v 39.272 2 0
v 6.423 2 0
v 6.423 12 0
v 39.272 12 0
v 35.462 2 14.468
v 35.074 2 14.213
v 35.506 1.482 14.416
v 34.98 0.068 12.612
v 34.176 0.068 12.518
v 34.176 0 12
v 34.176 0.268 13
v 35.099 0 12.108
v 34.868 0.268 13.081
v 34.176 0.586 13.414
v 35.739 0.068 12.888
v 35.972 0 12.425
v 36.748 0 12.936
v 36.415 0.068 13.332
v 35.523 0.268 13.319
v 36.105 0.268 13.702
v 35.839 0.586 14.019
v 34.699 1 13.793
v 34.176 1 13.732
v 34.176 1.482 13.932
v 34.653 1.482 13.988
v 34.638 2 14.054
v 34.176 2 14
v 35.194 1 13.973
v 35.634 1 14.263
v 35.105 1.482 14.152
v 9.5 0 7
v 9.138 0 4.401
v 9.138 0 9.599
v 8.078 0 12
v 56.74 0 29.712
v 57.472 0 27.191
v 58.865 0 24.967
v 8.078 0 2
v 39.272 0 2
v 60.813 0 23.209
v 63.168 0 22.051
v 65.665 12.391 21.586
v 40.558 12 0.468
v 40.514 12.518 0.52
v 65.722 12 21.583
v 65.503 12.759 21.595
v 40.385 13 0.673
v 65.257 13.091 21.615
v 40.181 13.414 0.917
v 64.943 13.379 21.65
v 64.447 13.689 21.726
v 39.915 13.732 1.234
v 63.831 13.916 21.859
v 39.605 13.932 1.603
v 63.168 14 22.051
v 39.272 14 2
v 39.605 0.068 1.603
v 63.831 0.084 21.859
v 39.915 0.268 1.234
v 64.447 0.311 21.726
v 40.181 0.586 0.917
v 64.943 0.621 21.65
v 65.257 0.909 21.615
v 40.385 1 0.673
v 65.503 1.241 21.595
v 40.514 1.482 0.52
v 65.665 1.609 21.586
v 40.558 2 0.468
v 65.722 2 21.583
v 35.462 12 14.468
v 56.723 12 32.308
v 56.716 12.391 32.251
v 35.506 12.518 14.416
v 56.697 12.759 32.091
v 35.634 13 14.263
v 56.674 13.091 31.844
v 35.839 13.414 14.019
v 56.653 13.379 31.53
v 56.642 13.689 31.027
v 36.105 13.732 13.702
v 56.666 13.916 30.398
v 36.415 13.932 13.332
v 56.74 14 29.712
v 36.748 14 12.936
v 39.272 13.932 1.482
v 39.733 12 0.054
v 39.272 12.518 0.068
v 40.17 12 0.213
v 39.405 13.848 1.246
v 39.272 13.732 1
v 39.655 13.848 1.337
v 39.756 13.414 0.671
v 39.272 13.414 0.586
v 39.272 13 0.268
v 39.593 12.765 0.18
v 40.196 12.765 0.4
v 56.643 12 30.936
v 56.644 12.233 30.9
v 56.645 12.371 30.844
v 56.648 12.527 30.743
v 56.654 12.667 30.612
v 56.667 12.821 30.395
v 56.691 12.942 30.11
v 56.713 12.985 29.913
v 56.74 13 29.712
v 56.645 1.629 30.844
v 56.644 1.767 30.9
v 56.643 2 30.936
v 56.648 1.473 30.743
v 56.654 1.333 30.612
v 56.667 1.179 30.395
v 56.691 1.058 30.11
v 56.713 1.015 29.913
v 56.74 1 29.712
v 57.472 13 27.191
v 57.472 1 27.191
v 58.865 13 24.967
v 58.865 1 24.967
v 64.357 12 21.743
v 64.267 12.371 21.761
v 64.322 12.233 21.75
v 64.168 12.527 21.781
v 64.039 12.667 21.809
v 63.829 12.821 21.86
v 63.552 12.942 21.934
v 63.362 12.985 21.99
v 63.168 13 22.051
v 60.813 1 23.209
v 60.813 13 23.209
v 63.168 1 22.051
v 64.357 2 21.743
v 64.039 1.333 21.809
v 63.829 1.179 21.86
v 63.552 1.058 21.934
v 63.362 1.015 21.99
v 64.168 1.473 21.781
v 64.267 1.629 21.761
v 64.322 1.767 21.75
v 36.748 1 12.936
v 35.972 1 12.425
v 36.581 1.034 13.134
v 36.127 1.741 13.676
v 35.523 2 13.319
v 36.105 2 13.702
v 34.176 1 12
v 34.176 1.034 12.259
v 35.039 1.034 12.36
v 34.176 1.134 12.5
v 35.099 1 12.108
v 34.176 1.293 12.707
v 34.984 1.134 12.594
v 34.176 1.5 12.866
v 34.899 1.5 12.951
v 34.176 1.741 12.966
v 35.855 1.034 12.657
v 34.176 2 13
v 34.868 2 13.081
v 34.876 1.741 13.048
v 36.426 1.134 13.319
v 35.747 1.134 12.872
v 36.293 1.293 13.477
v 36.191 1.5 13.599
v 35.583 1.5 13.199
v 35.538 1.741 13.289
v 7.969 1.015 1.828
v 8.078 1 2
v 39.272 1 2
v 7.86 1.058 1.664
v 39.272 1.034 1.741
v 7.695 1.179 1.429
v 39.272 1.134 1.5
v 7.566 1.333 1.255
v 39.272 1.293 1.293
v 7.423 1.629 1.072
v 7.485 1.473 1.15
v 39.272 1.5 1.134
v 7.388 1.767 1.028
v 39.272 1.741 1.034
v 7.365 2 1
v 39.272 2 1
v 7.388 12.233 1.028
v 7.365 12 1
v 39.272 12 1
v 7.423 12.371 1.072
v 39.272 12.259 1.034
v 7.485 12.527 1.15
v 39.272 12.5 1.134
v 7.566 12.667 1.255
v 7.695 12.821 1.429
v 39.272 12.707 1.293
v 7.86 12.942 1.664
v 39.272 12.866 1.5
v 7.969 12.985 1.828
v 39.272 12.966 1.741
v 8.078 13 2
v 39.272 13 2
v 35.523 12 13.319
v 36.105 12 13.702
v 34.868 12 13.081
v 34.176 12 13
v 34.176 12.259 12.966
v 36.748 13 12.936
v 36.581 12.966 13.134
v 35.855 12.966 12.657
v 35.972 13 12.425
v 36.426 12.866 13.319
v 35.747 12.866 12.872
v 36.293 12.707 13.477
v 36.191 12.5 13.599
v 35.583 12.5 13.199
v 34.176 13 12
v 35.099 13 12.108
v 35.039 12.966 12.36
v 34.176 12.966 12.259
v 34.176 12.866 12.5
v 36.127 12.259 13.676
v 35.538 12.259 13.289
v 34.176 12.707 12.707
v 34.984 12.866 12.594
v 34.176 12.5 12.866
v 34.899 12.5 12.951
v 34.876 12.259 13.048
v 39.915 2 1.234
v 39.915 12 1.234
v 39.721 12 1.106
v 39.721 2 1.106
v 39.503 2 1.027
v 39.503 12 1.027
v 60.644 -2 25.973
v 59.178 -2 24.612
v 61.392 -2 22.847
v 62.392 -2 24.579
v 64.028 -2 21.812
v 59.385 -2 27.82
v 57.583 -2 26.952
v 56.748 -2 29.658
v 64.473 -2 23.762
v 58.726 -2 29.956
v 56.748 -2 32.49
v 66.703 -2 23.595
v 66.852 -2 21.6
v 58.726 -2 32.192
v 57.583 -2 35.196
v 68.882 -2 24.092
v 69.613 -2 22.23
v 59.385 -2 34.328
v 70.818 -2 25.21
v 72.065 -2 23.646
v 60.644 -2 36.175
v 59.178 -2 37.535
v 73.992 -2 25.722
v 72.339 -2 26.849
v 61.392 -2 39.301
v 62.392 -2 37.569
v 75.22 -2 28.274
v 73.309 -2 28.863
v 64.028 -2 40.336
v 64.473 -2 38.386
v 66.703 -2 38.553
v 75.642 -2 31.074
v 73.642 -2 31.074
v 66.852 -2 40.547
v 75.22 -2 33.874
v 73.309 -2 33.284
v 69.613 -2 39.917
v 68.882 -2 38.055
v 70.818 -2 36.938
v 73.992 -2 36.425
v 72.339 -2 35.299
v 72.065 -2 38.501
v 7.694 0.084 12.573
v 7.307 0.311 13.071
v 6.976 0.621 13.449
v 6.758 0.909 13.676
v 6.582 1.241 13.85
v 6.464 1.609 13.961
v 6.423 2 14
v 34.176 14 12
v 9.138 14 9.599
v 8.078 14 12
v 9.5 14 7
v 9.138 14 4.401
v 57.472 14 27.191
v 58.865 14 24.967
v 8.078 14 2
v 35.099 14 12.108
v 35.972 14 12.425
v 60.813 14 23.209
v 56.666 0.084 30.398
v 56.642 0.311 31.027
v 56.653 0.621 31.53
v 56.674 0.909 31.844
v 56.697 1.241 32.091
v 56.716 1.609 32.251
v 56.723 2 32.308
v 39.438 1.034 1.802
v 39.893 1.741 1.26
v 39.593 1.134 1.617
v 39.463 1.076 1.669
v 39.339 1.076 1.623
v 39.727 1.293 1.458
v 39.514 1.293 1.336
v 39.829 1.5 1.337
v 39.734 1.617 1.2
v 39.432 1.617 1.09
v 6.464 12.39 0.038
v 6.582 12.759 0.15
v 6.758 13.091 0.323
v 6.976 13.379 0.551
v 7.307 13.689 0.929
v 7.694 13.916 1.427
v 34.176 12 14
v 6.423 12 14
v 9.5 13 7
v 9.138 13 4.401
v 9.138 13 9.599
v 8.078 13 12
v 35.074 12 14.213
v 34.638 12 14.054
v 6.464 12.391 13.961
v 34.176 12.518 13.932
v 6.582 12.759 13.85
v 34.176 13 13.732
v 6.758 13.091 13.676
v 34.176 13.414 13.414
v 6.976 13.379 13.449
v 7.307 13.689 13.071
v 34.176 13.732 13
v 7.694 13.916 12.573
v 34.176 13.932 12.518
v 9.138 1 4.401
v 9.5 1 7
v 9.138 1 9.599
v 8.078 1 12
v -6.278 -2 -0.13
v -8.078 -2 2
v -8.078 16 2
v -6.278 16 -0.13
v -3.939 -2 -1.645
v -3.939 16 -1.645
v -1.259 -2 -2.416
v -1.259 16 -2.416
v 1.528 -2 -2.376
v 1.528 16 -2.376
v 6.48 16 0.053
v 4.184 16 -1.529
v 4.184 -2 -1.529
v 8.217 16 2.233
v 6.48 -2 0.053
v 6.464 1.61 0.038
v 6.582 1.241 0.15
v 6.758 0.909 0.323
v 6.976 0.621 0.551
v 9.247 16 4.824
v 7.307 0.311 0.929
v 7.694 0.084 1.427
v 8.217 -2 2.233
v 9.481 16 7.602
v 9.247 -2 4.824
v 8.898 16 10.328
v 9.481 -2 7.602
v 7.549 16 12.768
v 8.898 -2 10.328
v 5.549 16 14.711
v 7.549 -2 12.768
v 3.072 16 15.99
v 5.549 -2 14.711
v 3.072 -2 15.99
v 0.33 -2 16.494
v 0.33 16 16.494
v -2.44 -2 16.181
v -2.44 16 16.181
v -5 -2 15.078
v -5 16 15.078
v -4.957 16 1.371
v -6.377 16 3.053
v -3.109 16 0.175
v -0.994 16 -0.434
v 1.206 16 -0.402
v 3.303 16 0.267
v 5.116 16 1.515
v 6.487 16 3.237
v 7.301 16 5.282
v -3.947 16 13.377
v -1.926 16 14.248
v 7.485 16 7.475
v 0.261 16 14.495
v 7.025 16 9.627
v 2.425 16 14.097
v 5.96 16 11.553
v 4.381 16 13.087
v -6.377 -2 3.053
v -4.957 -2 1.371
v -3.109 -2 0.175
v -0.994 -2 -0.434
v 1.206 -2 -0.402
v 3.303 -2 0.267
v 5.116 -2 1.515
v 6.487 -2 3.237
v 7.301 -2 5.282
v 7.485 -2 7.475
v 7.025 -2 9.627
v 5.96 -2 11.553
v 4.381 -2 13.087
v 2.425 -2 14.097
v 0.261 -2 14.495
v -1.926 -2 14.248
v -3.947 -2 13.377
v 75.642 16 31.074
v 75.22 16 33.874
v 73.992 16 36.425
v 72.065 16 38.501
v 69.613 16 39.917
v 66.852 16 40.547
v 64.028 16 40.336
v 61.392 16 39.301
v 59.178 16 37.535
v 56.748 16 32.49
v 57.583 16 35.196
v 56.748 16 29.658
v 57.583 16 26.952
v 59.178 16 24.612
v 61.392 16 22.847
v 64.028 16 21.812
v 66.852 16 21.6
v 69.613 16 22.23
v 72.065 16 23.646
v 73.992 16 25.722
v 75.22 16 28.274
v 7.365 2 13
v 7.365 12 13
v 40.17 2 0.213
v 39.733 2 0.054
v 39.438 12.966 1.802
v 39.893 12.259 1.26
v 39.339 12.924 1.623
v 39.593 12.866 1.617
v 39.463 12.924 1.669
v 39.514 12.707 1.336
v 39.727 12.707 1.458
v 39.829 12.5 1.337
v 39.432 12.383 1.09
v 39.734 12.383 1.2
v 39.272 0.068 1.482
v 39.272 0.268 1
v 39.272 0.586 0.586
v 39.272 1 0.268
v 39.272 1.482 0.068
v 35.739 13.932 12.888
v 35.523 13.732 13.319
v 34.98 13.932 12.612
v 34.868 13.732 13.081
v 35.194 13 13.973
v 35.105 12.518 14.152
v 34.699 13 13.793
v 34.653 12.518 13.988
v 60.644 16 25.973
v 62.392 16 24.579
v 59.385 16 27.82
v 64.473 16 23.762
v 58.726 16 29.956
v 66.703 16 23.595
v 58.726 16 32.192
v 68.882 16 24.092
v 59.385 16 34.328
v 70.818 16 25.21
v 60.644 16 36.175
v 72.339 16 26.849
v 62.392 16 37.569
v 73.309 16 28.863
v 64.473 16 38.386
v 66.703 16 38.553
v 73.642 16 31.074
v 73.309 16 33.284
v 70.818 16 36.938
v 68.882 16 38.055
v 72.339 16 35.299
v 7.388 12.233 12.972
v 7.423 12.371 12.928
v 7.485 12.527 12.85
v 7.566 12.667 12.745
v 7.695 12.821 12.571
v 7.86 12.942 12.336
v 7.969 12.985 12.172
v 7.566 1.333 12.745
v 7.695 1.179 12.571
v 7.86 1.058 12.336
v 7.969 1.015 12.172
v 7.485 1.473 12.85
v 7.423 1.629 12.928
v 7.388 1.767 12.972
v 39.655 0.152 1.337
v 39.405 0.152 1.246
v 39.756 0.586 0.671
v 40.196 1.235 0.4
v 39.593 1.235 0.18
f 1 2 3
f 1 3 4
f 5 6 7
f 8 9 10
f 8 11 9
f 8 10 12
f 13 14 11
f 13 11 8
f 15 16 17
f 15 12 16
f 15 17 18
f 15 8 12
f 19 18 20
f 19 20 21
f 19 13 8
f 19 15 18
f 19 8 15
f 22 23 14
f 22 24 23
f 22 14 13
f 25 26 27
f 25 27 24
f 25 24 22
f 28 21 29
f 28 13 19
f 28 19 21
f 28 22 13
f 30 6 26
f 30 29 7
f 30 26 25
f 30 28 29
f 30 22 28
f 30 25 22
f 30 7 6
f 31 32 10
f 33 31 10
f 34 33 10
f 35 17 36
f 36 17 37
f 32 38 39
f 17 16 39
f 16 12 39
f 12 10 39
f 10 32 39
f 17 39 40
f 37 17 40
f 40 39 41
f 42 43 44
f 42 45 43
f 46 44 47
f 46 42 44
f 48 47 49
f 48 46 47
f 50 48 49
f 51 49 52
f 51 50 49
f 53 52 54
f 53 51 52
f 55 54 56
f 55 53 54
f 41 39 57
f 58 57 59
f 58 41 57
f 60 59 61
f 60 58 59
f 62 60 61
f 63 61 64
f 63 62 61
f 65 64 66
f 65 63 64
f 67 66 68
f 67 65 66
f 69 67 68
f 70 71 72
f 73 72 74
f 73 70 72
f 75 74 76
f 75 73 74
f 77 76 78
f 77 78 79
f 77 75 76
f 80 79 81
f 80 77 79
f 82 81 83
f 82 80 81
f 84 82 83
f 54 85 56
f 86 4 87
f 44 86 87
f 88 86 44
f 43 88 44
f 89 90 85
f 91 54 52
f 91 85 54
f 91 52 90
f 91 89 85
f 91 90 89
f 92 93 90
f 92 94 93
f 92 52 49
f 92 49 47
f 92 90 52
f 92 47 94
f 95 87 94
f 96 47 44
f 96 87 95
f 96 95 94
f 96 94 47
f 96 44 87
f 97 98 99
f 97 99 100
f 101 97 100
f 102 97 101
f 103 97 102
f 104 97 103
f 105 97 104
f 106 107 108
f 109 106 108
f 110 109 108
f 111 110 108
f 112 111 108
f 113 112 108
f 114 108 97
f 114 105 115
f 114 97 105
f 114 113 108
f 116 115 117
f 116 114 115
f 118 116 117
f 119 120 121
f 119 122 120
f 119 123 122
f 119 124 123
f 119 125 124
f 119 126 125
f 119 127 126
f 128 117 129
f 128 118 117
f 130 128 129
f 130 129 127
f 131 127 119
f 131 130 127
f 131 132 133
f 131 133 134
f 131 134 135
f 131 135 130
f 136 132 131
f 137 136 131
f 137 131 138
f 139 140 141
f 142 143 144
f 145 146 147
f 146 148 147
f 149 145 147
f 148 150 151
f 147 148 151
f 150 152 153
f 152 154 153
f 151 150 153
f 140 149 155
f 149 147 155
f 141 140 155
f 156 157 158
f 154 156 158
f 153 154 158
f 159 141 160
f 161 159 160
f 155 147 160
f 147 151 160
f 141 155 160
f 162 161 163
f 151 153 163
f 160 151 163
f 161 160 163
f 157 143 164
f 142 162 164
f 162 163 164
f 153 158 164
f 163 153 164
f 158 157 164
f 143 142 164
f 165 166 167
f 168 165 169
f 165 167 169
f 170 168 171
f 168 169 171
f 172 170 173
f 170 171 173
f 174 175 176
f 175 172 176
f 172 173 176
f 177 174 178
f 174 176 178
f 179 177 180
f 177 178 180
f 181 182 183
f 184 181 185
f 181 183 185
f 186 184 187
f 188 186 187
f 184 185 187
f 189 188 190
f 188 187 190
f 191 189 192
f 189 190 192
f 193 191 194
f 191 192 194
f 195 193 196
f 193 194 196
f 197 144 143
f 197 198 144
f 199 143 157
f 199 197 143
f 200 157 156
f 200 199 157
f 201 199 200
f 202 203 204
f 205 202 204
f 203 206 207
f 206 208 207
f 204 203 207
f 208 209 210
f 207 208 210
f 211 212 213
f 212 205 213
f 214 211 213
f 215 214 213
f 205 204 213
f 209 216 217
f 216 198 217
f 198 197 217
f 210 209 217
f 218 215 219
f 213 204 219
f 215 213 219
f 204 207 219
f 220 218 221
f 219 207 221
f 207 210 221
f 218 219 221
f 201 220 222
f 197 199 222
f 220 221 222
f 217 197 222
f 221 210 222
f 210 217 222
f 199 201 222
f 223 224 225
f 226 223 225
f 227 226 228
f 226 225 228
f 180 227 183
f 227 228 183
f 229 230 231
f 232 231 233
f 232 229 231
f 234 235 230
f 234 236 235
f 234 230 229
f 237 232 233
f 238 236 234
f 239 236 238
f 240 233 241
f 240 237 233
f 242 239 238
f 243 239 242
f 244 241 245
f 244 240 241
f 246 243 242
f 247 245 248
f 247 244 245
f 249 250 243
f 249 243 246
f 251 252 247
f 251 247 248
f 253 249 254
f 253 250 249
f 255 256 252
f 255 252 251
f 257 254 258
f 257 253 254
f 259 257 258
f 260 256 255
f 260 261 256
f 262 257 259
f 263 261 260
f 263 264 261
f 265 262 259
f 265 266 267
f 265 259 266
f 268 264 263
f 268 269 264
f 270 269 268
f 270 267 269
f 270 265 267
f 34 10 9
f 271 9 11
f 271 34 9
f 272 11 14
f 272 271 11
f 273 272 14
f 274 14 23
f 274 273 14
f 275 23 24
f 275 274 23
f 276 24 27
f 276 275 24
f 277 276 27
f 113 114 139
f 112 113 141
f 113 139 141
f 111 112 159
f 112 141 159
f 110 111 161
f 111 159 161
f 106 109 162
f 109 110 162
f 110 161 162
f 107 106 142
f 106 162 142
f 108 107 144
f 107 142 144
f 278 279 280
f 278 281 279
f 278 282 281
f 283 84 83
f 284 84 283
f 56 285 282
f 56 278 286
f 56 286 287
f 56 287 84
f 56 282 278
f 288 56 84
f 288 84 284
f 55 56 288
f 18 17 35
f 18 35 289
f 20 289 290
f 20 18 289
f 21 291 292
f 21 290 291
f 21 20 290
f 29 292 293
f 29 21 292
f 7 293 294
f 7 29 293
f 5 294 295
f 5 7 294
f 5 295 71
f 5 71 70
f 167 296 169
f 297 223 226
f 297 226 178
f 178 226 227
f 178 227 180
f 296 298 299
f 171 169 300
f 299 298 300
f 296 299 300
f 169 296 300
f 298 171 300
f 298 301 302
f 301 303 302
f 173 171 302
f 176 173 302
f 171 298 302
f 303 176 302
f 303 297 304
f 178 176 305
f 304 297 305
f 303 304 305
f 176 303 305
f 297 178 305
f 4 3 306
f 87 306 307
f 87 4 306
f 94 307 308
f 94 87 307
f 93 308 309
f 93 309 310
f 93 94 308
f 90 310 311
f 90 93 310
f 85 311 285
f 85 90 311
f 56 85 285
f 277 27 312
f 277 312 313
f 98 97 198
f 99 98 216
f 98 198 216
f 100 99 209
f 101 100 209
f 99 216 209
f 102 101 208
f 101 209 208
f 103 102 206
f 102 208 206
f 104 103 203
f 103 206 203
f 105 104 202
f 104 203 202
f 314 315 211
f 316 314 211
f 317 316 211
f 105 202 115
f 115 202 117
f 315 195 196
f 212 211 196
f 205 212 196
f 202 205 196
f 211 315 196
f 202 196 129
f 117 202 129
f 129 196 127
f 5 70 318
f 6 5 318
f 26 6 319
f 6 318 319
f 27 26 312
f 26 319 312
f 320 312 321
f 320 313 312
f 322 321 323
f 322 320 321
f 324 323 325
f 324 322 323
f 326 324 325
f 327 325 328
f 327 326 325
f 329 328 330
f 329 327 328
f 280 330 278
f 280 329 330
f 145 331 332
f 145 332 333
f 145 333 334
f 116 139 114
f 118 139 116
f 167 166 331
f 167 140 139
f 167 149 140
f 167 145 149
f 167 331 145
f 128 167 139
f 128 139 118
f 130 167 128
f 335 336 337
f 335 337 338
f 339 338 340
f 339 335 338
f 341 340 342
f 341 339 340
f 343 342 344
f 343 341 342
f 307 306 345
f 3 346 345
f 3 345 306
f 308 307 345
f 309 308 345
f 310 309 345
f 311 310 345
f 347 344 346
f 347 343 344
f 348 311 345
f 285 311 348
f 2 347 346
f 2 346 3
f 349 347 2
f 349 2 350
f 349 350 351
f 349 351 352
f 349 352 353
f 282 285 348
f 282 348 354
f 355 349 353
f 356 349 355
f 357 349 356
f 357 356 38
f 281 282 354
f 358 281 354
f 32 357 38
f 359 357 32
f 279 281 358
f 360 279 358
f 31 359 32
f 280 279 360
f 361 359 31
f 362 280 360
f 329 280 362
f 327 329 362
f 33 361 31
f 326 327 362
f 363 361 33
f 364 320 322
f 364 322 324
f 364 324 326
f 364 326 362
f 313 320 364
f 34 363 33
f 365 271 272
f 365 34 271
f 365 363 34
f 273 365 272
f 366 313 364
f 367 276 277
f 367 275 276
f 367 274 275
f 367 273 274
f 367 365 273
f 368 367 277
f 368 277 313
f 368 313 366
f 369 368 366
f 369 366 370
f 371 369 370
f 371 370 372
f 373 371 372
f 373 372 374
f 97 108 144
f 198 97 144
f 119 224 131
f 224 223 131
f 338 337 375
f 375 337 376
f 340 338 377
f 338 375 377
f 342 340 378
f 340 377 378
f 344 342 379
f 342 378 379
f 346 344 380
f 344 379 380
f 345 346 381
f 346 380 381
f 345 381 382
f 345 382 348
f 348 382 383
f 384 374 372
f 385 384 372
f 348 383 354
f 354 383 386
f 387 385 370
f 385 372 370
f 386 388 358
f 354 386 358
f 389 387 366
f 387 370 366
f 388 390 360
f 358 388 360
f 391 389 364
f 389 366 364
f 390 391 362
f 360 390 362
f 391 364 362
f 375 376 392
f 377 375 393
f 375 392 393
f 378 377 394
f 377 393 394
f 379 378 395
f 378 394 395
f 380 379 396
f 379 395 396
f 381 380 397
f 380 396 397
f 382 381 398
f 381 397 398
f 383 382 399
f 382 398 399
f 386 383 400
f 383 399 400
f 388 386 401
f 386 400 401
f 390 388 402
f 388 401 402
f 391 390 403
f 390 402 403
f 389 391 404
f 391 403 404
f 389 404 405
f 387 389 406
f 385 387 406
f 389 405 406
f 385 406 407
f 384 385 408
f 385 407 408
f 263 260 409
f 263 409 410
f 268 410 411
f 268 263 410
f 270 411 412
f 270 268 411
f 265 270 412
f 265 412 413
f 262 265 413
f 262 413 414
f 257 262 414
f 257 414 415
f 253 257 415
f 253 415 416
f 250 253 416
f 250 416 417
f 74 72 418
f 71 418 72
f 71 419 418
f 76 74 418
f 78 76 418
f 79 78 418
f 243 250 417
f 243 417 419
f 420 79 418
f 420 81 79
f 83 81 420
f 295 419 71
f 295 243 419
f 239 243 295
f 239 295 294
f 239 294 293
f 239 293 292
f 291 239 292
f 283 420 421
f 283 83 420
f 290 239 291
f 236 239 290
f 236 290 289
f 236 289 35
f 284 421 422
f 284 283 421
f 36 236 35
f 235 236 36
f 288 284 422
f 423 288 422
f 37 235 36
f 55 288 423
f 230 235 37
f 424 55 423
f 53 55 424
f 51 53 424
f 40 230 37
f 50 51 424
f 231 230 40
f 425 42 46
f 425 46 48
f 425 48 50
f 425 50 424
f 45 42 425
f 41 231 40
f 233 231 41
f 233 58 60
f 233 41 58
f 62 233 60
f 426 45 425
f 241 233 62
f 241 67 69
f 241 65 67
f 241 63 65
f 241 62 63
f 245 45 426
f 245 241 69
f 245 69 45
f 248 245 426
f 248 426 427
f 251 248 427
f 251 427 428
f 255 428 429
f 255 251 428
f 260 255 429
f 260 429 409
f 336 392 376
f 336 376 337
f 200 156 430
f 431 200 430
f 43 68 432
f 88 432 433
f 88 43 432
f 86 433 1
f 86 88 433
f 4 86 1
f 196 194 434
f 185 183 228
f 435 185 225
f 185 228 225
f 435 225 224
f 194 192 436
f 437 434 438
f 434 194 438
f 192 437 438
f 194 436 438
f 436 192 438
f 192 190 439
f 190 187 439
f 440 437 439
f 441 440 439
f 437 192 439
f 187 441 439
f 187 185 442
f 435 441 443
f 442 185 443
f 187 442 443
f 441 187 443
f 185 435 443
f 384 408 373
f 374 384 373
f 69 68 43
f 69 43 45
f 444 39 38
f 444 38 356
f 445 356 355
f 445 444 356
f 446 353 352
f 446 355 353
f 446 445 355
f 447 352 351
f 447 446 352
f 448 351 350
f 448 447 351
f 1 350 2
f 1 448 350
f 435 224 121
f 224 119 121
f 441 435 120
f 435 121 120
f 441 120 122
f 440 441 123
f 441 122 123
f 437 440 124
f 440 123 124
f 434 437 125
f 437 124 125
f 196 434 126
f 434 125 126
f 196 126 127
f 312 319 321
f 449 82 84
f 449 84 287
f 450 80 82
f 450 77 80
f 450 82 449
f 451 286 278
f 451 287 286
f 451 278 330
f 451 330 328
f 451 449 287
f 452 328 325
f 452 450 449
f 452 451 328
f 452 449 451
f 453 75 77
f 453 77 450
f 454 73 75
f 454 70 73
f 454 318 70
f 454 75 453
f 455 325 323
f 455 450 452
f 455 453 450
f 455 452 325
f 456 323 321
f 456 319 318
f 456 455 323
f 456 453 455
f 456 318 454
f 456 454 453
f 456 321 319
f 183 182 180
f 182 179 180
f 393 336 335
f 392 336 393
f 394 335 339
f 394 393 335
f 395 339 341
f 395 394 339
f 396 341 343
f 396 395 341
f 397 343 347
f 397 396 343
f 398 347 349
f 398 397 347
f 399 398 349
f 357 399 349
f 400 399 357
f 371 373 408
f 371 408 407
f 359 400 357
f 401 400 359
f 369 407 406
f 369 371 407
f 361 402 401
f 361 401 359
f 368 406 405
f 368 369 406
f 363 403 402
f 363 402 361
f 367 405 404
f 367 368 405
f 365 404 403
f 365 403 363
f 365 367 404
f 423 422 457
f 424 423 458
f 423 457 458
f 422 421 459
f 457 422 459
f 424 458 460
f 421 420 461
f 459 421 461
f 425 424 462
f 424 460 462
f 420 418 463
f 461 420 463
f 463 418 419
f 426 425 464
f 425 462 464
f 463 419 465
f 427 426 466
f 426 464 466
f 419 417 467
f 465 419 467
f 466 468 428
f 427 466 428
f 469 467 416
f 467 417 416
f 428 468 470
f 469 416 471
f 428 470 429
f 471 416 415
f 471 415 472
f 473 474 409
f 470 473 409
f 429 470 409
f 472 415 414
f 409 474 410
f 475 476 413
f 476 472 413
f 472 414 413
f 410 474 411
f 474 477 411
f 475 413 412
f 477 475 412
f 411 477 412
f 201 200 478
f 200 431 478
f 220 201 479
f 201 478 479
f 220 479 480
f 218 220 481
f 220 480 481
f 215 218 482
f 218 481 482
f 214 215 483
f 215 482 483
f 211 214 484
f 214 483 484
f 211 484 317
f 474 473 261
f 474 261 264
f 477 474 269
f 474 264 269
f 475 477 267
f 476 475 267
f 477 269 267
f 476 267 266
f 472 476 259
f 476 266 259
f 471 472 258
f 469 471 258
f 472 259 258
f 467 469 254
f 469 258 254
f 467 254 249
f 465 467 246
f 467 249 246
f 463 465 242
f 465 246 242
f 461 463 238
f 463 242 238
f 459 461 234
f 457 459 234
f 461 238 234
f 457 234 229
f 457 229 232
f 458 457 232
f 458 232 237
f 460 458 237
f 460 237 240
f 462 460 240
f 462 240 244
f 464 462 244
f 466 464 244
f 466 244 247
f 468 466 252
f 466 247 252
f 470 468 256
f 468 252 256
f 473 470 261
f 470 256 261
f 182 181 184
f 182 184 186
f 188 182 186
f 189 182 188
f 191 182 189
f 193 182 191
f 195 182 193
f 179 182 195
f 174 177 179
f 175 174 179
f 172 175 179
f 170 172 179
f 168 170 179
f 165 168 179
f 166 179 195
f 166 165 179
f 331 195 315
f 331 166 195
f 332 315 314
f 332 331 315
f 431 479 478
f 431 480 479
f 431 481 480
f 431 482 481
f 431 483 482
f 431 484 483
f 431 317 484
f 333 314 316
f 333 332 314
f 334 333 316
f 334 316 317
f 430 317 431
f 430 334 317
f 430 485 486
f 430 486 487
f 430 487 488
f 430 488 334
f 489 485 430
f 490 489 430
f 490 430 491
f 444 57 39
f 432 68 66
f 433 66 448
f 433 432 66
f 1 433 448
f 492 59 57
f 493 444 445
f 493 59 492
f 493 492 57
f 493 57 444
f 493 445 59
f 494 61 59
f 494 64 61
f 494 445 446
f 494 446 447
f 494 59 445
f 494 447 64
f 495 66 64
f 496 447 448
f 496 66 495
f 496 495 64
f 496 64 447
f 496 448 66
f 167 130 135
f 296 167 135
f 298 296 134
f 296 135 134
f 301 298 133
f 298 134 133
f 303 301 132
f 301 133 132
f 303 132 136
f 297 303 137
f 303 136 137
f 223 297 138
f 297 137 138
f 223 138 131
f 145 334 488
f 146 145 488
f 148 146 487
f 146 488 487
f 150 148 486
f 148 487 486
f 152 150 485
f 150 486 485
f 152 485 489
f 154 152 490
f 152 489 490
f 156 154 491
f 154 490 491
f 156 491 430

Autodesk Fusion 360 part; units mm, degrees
sketch "Sketch1" plane through (0, 0, 0) normal (0, 1, 0) x (1, 0, 0)
  line L0 (0, 0) -> (40, 0)
  line L1 (34.9044, -14) -> (0, -14)
  line L2 (0, -14) -> (0, 0)
  line L3 (61.6428, -36.4361) -> (34.9044, -14)
  line L4 (70.6418, -25.7115) -> (61.6428, -36.4361)
  line L5 (40, 0) -> (70.6418, -25.7115)
  dimension "d1" = 40
  dimension "d2" = 14
  dimension "d3" = 14
  dimension "d4" = 40
  dimension "d5" = 140
extrude "Extrude1" add sketch "Sketch1" along normal blind 14
fillet "Fillet1" radius 2 10 edges at (17.4522, 0, 14) (20, 0, 0) (34.9044, 7, 14) (48.2736, 0, 25.2181) (17.4522, 14, 14) (55.3209, 0, 12.8558) (48.2736, 14, 25.2181) (55.3209, 14, 12.8558) (20, 14, 0) (40, 7, 0)
shell "Shell1" thickness 1 removed faces 2 at (0, 5.3333, 9.3333) at (66.7851, 5.3333, 30.3078)
sketch "Sketch2" plane through (0, 0, 0) normal (0, -1, 0) x (1, 0, 0)
  line L0 (39.2721, 2) -> (69.3562, 27.2436)
  line L1 (69.3562, 27.2436) -> (62.9283, 34.904)
  line L2 (62.9283, 34.904) -> (36.7476, 12.9358)
  arc A0 (34.1765, 12) -> (36.7476, 12.9358) centre (34.1765, 16) ccw
  line L3 (34.1765, 12) -> (0, 12)
  line L4 (0, 12) -> (0, 2)
  line L5 (0, 2) -> (39.2721, 2)
  circle A1 centre (0, 7) radius 9.5
  circle A2 centre (66.1423, 31.0738) radius 9.5
  dimension "d11" = 19
  dimension "d12" = 19
extrude "Extrude2" add sketch "Sketch2" along normal blind -16 and the other way blind -2 contours L0 L1 L2 A2 | L0 L1 L2 A2 | L3 L4 L5 A1 | L3 L4 L5 A1
sketch "Sketch3" plane through (0, -2, 0) normal (0, -1, 0) x (1, 0, 0)
  circle A0 centre (66.1423, 31.0738) radius 9.5
  circle A1 centre (66.1423, 31.0738) radius 7.5
  dimension "d17" = -2
extrude "Extrude3" cut sketch "Sketch3" against normal through all contours A1
sketch "Sketch4" plane through (0, -2, 0) normal (0, -1, 0) x (1, 0, 0)
  circle A0 centre (0, 7) radius 9.5
  line L0 (0, 7) -> (-5, 15.0777)
  circle A1 centre (0, 7) radius 7.5
  line L1 (0, 7) -> (-8.0777, 2)
  line L2 (0, 7) -> (0, 10.0999)
  line L3 (0, 10.0999) -> (0, 16.5)
  dimension "d19" = -2
  dimension "d20" = 90
  dimension "d21" = 5
extrude "Extrude4" cut sketch "Sketch4" against normal blind 40 contours A0 L0 A1 L1 | L0 A1 L2 L3 | A1 L1 L2 L3 | L0 A1 L1
